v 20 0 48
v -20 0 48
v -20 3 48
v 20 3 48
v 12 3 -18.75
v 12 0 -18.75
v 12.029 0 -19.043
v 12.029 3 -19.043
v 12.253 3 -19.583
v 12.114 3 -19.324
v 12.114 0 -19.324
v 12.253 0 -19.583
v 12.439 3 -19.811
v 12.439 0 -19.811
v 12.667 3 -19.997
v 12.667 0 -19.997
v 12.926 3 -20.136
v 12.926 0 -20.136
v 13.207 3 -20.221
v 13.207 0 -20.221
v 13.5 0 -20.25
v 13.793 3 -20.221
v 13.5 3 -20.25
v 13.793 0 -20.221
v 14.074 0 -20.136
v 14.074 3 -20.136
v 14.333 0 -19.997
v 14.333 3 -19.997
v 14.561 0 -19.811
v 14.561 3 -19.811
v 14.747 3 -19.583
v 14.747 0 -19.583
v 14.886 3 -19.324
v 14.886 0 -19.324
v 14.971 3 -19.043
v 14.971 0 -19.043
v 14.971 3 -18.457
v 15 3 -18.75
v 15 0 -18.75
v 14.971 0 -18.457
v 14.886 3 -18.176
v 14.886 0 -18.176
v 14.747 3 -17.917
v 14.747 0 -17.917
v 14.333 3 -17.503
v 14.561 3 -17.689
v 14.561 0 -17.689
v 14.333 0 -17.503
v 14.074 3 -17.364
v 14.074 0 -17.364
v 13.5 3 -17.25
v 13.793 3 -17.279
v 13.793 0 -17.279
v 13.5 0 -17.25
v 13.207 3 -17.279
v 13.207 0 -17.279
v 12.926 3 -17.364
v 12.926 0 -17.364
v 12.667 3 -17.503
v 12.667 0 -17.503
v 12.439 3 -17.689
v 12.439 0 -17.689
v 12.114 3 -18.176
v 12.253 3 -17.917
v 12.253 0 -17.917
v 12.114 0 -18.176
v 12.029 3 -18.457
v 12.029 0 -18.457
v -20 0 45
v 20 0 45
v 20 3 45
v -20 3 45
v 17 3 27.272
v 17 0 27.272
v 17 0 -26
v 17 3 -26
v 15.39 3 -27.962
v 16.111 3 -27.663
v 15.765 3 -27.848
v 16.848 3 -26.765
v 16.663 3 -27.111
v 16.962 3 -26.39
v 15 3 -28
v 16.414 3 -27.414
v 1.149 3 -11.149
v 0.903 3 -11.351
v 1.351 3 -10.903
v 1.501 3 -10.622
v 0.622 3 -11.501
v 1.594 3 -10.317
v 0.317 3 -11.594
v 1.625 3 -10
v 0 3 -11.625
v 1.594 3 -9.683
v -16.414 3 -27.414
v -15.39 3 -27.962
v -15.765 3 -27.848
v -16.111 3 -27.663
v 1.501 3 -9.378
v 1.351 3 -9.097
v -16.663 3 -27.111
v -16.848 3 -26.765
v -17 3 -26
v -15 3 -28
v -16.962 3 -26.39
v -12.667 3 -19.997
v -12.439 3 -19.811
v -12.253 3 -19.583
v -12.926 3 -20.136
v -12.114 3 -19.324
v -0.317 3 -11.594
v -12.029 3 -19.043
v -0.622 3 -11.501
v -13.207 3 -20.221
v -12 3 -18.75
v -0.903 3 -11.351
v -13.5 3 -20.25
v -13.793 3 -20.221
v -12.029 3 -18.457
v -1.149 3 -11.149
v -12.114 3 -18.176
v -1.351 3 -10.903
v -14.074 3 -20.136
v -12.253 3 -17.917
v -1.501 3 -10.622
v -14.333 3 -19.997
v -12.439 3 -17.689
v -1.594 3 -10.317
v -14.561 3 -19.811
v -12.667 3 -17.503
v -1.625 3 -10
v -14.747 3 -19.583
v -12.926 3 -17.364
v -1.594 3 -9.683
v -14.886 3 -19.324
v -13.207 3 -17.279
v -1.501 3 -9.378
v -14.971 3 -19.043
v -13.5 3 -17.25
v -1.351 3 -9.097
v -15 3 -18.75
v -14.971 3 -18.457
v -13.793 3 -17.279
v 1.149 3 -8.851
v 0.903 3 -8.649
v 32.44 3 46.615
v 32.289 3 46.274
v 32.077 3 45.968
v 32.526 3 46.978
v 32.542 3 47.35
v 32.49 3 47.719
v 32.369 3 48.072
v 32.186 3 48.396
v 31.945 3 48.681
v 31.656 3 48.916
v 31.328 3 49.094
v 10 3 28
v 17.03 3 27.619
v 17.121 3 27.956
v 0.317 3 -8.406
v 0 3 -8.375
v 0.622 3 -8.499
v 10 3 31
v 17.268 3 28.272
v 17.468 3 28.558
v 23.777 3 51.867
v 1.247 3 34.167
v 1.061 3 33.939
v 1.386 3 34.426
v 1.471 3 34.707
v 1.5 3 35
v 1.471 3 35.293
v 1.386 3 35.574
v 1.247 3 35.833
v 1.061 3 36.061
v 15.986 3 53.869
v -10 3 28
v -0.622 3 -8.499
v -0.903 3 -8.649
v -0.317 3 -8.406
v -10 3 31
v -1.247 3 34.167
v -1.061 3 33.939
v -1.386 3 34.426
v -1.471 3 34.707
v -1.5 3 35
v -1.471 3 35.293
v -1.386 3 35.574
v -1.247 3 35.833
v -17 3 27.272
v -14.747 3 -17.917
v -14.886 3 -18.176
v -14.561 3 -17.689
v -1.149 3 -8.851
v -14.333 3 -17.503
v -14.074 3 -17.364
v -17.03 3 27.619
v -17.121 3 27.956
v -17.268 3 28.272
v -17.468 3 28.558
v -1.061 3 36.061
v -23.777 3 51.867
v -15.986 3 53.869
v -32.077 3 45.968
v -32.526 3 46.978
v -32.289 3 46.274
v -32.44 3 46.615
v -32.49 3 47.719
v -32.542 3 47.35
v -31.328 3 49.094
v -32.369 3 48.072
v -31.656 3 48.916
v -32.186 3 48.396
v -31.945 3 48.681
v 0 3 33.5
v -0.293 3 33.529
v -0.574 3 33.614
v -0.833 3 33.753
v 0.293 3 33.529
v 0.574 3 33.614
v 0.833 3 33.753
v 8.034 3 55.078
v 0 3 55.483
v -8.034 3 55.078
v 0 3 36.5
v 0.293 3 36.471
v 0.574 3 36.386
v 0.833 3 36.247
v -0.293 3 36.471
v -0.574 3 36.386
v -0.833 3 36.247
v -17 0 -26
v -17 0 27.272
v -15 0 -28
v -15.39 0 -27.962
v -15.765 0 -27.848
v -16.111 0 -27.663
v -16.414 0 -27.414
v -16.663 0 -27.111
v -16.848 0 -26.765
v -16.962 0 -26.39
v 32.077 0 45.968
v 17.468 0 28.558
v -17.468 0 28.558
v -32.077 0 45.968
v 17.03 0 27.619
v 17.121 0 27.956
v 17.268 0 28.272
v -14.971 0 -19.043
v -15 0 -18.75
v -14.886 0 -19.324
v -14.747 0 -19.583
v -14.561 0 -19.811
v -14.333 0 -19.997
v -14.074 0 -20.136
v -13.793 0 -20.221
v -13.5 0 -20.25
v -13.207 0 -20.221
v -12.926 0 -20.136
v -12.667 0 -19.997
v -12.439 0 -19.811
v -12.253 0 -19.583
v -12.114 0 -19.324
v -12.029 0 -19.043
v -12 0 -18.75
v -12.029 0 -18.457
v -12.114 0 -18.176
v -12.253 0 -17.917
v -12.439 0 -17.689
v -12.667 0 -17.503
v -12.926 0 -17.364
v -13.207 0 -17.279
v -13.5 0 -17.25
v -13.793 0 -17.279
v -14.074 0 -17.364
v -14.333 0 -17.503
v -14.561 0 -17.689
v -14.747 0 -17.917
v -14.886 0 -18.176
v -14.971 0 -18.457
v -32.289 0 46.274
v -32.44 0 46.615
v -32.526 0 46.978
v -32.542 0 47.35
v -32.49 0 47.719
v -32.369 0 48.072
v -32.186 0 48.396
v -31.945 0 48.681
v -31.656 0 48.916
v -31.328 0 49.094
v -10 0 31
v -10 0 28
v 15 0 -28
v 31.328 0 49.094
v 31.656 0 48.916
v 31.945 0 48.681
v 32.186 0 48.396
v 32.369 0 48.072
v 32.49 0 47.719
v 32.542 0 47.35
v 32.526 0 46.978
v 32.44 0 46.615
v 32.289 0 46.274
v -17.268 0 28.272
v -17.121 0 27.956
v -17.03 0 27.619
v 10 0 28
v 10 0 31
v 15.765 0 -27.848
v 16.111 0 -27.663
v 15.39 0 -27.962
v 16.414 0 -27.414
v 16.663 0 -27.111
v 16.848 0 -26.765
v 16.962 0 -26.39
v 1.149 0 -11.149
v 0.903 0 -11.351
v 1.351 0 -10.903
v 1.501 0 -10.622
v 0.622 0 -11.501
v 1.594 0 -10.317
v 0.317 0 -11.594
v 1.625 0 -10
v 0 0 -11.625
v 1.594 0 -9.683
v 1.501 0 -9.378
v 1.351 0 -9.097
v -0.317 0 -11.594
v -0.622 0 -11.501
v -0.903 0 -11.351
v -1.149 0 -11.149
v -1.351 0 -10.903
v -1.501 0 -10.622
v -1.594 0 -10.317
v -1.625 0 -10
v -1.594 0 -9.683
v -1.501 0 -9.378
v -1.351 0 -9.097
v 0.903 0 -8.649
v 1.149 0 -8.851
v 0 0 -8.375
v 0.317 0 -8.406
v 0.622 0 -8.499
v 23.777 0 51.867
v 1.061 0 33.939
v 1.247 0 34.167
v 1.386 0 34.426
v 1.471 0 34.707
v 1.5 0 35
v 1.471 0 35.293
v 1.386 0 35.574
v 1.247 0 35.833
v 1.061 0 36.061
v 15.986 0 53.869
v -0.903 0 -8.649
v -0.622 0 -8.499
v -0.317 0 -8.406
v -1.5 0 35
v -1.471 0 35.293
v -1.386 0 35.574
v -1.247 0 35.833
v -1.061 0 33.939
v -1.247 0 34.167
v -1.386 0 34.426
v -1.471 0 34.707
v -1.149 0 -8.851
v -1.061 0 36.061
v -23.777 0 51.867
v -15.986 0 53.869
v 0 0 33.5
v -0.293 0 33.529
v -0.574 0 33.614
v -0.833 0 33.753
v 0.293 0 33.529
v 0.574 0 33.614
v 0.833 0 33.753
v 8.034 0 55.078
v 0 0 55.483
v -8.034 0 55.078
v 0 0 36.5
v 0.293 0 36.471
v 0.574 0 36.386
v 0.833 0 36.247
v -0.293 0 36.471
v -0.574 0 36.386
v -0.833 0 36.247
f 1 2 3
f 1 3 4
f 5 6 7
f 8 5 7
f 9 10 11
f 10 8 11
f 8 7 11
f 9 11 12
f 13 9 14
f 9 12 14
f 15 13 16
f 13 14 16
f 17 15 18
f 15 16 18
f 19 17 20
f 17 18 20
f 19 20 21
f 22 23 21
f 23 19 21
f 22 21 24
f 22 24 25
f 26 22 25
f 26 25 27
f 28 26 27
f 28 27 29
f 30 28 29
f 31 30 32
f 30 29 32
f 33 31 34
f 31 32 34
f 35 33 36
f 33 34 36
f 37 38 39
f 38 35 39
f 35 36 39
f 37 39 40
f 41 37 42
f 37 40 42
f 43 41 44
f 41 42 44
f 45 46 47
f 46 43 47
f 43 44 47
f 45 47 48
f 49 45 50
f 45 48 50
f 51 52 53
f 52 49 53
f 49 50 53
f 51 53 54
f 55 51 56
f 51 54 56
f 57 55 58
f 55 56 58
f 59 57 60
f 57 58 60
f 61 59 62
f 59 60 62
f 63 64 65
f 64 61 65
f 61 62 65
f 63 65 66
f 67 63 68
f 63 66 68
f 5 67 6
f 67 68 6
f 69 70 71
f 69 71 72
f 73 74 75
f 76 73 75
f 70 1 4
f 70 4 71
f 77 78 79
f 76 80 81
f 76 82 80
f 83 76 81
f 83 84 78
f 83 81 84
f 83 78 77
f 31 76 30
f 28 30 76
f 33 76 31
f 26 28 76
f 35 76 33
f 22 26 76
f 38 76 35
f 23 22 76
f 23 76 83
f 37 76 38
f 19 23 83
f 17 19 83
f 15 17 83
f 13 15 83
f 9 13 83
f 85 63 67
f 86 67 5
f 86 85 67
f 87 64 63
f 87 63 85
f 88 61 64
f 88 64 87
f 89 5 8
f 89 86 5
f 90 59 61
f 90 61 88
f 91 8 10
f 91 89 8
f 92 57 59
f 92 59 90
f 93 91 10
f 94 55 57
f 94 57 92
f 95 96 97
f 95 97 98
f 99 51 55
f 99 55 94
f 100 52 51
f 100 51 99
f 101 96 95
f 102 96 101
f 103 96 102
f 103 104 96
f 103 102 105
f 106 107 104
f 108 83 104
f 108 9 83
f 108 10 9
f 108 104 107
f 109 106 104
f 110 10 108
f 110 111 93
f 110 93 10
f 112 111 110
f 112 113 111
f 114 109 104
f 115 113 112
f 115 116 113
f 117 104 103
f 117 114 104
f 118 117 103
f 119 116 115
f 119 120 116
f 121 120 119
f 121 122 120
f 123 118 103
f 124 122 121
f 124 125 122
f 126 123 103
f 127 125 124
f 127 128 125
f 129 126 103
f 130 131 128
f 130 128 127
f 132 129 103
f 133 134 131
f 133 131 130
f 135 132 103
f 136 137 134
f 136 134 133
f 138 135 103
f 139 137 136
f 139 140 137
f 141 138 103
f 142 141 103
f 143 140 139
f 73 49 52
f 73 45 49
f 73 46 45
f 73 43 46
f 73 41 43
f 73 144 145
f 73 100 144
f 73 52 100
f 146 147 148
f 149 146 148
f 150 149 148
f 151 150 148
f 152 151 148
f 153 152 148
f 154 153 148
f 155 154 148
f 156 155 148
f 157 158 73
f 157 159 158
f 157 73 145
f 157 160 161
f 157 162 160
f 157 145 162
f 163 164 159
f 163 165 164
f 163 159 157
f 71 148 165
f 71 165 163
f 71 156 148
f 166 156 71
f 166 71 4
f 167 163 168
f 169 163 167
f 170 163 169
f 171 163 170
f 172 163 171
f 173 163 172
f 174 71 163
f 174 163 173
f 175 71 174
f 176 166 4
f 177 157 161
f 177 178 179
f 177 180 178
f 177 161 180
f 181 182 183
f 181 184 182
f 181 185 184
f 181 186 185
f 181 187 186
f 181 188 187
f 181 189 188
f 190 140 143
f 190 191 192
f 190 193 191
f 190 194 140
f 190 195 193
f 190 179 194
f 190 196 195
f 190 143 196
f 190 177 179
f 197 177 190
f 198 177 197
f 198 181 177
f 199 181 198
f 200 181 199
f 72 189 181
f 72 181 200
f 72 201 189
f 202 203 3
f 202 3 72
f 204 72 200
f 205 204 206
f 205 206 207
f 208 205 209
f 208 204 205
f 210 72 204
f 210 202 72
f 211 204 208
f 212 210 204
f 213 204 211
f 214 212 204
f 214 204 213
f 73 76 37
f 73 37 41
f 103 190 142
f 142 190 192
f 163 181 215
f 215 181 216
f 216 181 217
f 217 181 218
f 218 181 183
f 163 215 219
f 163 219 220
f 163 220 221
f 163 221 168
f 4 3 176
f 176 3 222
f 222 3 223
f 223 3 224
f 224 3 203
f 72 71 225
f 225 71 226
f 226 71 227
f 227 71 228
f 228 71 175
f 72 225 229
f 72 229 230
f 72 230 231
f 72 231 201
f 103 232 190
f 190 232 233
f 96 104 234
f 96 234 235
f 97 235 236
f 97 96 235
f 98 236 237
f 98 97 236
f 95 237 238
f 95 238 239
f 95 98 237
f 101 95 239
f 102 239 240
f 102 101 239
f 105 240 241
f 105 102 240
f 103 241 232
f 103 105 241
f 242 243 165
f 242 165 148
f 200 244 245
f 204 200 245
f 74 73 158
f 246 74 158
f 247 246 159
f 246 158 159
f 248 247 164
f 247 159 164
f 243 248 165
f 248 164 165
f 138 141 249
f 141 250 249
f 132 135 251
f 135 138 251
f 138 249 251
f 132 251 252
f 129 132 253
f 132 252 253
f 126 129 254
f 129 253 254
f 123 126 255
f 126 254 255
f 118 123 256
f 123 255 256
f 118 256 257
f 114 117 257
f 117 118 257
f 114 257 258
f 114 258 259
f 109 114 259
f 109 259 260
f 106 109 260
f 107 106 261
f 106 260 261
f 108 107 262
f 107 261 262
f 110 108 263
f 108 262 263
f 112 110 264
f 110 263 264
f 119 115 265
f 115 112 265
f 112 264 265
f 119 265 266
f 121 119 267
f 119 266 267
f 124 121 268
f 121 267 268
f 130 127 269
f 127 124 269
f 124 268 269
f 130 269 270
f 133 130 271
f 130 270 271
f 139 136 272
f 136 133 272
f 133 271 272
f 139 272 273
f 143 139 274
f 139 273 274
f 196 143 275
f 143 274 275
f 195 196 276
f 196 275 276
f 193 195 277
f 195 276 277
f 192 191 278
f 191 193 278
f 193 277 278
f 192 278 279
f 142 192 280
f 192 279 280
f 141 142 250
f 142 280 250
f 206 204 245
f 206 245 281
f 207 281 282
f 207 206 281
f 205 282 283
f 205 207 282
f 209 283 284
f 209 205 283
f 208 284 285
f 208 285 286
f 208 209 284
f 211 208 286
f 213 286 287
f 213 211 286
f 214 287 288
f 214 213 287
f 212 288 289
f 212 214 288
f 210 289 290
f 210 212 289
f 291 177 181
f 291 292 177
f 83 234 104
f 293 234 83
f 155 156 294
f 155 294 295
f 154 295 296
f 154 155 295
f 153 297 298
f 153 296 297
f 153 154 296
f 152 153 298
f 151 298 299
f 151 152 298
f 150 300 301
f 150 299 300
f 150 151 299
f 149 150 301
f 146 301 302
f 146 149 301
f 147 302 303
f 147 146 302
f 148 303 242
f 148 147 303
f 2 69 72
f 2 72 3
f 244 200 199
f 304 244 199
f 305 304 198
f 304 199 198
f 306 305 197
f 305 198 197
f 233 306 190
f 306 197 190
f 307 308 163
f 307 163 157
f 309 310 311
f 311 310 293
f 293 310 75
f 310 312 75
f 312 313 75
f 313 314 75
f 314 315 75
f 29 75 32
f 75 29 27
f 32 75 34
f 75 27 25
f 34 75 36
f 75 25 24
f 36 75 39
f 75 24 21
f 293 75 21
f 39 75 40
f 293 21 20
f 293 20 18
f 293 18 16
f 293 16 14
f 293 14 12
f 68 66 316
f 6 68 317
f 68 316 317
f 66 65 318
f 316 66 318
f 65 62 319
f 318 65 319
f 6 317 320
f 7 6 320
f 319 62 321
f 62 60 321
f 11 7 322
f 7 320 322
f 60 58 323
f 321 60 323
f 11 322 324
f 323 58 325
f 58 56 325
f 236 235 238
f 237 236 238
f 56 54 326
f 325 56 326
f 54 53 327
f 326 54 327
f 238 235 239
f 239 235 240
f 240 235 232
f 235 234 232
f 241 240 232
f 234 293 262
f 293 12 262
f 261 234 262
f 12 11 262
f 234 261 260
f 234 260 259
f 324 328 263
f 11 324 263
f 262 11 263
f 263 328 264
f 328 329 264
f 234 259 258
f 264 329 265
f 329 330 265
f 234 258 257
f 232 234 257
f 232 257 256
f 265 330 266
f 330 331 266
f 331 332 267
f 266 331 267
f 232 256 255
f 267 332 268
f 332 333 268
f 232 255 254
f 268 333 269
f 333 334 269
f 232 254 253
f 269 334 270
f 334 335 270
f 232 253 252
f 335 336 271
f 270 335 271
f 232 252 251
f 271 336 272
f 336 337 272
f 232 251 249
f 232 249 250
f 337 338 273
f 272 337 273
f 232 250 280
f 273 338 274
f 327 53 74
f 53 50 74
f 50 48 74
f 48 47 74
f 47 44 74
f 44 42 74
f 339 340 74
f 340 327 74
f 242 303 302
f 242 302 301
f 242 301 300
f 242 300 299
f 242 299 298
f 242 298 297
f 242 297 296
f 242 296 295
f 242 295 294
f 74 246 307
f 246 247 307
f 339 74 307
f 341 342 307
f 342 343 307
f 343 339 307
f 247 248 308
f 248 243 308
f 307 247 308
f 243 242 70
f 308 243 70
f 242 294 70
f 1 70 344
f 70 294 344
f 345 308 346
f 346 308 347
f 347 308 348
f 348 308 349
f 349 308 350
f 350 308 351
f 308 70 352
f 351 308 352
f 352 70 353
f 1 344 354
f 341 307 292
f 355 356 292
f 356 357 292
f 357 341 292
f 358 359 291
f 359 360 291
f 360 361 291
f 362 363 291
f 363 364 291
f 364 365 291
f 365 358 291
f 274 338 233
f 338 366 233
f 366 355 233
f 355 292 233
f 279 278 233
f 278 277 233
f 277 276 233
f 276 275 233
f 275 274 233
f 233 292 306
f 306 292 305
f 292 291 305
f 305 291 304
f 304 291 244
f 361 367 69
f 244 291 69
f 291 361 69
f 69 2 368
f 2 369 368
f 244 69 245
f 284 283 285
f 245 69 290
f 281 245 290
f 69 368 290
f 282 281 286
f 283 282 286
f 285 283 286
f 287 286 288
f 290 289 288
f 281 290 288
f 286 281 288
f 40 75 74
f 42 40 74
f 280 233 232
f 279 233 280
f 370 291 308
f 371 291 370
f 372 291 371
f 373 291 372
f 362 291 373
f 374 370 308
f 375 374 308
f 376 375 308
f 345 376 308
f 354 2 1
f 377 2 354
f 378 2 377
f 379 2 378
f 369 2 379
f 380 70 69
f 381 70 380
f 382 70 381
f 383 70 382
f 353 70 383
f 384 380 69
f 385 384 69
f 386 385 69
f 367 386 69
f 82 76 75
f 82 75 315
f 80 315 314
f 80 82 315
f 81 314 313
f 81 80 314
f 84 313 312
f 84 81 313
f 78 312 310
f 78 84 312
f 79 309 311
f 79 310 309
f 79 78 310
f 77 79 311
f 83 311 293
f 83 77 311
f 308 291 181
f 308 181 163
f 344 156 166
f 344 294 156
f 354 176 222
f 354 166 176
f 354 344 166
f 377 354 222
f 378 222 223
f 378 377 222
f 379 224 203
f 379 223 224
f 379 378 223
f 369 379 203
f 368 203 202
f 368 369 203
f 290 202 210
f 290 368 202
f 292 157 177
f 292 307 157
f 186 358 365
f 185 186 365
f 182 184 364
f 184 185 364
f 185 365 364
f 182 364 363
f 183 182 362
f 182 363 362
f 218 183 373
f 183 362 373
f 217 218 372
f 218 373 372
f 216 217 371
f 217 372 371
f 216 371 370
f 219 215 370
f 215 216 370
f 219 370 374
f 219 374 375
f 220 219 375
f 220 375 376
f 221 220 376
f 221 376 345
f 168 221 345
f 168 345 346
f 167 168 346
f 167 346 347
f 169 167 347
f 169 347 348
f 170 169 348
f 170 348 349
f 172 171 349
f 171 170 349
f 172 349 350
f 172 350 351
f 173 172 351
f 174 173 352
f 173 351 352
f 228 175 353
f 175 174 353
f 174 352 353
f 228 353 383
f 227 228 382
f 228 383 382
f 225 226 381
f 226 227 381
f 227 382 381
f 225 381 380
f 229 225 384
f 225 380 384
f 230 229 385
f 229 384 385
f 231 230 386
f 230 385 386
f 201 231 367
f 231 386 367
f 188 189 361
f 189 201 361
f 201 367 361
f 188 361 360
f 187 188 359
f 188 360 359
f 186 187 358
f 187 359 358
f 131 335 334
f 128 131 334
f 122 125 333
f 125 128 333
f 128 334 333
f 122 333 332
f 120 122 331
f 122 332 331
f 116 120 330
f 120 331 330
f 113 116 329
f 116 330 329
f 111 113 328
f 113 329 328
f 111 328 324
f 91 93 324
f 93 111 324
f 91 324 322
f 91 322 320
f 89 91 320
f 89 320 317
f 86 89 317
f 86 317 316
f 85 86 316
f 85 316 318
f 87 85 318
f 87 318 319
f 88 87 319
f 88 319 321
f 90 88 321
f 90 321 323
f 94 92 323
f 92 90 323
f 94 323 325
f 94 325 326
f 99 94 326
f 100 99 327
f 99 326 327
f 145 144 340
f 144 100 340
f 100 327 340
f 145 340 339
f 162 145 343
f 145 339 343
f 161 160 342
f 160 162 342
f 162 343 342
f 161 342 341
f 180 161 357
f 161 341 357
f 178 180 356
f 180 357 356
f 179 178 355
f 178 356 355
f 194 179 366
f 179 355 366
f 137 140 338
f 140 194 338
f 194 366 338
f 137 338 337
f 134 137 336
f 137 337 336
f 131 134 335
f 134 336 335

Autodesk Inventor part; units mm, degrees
ref_plane "YZ Plane" through (0, 0, 0) normal (1, 0, 0) x (0, 1, 0)
ref_plane "XZ Plane" through (0, 0, 0) normal (0, 1, 0) x (-1, 0, 0)
ref_plane "XY Plane" through (0, 0, 0) normal (0, 0, 1) x (1, 0, 0)
sketch "Sketch1" plane through (0, 0, 0) normal (0, 1, 0) x (-1, 0, 0)
  line L0 (46, 0) -> (-35, 0) construction
  line L1 (0, 54.3949) -> (0, -60) construction
  line L2 (17, -28) -> (17, 28)
  circle A0 centre (13.5, -18.75) radius 1.5
  line L3 (-17, 28) -> (-17, -28)
  line L4 (17, -28) -> (-17, -28)
  line L5 (17, 28) -> (33.782, 48)
  line L6 (17, 28) -> (43.1081, 28) construction
  line L7 (-17, 28) -> (-33.782, 48)
  arc A1 (33.782, 48) -> (-33.782, 48) centre (0, -24.5174) ccw
  line L8 (20, 48) -> (-20, 48)
  line L9 (-20, 48) -> (-20, 45)
  line L10 (-20, 45) -> (20, 45)
  line L11 (20, 45) -> (20, 48)
  circle A2 centre (0, 35) radius 1.5
  circle A3 centre (-13.5, -18.75) radius 1.5
  circle A4 centre (0, -10) radius 1.625
  line L12 (10, 31) -> (-10, 31)
  line L13 (-10, 31) -> (-10, 28)
  line L14 (-10, 28) -> (10, 28)
  line L15 (10, 28) -> (10, 31)
  point P0 (0, 0)
  dimension "d16" = 3
  dimension "d35" = 50
  dimension "d36" = 20
  dimension "d37" = 56
  dimension "d38" = 80
  dimension "d39" = 40
  dimension "d41" = 3
  dimension "d43" = 9.25
  dimension "d44" = 3
  dimension "d45" = 10
  dimension "d49" = 45
  dimension "d50" = 34
  dimension "d51" = 28
  dimension "d52" = 13.5
  dimension "d53" = 3.25
  dimension "d54" = 18
  dimension "d58" = 20
  dimension "d59" = 28
  dimension "d60" = 3
extrude "Extrusion3" add sketch "Sketch1" along normal blind 3 contours L4 L3 L7 A1 L5 L2 | L15 L14 L13 L12
fillet "Fillet3" radius 2 6 edges at (-33.782, 1.5, 48) (-17, 1.5, 28) (33.782, 1.5, 48) (17, 1.5, 28) (-17, 1.5, -28) (17, 1.5, -28)
extrude "Extrusion4" cut sketch "Sketch1" along normal blind 3 contours L15 L14 L13 L12
properties part number "bracket_camera_bottom"
